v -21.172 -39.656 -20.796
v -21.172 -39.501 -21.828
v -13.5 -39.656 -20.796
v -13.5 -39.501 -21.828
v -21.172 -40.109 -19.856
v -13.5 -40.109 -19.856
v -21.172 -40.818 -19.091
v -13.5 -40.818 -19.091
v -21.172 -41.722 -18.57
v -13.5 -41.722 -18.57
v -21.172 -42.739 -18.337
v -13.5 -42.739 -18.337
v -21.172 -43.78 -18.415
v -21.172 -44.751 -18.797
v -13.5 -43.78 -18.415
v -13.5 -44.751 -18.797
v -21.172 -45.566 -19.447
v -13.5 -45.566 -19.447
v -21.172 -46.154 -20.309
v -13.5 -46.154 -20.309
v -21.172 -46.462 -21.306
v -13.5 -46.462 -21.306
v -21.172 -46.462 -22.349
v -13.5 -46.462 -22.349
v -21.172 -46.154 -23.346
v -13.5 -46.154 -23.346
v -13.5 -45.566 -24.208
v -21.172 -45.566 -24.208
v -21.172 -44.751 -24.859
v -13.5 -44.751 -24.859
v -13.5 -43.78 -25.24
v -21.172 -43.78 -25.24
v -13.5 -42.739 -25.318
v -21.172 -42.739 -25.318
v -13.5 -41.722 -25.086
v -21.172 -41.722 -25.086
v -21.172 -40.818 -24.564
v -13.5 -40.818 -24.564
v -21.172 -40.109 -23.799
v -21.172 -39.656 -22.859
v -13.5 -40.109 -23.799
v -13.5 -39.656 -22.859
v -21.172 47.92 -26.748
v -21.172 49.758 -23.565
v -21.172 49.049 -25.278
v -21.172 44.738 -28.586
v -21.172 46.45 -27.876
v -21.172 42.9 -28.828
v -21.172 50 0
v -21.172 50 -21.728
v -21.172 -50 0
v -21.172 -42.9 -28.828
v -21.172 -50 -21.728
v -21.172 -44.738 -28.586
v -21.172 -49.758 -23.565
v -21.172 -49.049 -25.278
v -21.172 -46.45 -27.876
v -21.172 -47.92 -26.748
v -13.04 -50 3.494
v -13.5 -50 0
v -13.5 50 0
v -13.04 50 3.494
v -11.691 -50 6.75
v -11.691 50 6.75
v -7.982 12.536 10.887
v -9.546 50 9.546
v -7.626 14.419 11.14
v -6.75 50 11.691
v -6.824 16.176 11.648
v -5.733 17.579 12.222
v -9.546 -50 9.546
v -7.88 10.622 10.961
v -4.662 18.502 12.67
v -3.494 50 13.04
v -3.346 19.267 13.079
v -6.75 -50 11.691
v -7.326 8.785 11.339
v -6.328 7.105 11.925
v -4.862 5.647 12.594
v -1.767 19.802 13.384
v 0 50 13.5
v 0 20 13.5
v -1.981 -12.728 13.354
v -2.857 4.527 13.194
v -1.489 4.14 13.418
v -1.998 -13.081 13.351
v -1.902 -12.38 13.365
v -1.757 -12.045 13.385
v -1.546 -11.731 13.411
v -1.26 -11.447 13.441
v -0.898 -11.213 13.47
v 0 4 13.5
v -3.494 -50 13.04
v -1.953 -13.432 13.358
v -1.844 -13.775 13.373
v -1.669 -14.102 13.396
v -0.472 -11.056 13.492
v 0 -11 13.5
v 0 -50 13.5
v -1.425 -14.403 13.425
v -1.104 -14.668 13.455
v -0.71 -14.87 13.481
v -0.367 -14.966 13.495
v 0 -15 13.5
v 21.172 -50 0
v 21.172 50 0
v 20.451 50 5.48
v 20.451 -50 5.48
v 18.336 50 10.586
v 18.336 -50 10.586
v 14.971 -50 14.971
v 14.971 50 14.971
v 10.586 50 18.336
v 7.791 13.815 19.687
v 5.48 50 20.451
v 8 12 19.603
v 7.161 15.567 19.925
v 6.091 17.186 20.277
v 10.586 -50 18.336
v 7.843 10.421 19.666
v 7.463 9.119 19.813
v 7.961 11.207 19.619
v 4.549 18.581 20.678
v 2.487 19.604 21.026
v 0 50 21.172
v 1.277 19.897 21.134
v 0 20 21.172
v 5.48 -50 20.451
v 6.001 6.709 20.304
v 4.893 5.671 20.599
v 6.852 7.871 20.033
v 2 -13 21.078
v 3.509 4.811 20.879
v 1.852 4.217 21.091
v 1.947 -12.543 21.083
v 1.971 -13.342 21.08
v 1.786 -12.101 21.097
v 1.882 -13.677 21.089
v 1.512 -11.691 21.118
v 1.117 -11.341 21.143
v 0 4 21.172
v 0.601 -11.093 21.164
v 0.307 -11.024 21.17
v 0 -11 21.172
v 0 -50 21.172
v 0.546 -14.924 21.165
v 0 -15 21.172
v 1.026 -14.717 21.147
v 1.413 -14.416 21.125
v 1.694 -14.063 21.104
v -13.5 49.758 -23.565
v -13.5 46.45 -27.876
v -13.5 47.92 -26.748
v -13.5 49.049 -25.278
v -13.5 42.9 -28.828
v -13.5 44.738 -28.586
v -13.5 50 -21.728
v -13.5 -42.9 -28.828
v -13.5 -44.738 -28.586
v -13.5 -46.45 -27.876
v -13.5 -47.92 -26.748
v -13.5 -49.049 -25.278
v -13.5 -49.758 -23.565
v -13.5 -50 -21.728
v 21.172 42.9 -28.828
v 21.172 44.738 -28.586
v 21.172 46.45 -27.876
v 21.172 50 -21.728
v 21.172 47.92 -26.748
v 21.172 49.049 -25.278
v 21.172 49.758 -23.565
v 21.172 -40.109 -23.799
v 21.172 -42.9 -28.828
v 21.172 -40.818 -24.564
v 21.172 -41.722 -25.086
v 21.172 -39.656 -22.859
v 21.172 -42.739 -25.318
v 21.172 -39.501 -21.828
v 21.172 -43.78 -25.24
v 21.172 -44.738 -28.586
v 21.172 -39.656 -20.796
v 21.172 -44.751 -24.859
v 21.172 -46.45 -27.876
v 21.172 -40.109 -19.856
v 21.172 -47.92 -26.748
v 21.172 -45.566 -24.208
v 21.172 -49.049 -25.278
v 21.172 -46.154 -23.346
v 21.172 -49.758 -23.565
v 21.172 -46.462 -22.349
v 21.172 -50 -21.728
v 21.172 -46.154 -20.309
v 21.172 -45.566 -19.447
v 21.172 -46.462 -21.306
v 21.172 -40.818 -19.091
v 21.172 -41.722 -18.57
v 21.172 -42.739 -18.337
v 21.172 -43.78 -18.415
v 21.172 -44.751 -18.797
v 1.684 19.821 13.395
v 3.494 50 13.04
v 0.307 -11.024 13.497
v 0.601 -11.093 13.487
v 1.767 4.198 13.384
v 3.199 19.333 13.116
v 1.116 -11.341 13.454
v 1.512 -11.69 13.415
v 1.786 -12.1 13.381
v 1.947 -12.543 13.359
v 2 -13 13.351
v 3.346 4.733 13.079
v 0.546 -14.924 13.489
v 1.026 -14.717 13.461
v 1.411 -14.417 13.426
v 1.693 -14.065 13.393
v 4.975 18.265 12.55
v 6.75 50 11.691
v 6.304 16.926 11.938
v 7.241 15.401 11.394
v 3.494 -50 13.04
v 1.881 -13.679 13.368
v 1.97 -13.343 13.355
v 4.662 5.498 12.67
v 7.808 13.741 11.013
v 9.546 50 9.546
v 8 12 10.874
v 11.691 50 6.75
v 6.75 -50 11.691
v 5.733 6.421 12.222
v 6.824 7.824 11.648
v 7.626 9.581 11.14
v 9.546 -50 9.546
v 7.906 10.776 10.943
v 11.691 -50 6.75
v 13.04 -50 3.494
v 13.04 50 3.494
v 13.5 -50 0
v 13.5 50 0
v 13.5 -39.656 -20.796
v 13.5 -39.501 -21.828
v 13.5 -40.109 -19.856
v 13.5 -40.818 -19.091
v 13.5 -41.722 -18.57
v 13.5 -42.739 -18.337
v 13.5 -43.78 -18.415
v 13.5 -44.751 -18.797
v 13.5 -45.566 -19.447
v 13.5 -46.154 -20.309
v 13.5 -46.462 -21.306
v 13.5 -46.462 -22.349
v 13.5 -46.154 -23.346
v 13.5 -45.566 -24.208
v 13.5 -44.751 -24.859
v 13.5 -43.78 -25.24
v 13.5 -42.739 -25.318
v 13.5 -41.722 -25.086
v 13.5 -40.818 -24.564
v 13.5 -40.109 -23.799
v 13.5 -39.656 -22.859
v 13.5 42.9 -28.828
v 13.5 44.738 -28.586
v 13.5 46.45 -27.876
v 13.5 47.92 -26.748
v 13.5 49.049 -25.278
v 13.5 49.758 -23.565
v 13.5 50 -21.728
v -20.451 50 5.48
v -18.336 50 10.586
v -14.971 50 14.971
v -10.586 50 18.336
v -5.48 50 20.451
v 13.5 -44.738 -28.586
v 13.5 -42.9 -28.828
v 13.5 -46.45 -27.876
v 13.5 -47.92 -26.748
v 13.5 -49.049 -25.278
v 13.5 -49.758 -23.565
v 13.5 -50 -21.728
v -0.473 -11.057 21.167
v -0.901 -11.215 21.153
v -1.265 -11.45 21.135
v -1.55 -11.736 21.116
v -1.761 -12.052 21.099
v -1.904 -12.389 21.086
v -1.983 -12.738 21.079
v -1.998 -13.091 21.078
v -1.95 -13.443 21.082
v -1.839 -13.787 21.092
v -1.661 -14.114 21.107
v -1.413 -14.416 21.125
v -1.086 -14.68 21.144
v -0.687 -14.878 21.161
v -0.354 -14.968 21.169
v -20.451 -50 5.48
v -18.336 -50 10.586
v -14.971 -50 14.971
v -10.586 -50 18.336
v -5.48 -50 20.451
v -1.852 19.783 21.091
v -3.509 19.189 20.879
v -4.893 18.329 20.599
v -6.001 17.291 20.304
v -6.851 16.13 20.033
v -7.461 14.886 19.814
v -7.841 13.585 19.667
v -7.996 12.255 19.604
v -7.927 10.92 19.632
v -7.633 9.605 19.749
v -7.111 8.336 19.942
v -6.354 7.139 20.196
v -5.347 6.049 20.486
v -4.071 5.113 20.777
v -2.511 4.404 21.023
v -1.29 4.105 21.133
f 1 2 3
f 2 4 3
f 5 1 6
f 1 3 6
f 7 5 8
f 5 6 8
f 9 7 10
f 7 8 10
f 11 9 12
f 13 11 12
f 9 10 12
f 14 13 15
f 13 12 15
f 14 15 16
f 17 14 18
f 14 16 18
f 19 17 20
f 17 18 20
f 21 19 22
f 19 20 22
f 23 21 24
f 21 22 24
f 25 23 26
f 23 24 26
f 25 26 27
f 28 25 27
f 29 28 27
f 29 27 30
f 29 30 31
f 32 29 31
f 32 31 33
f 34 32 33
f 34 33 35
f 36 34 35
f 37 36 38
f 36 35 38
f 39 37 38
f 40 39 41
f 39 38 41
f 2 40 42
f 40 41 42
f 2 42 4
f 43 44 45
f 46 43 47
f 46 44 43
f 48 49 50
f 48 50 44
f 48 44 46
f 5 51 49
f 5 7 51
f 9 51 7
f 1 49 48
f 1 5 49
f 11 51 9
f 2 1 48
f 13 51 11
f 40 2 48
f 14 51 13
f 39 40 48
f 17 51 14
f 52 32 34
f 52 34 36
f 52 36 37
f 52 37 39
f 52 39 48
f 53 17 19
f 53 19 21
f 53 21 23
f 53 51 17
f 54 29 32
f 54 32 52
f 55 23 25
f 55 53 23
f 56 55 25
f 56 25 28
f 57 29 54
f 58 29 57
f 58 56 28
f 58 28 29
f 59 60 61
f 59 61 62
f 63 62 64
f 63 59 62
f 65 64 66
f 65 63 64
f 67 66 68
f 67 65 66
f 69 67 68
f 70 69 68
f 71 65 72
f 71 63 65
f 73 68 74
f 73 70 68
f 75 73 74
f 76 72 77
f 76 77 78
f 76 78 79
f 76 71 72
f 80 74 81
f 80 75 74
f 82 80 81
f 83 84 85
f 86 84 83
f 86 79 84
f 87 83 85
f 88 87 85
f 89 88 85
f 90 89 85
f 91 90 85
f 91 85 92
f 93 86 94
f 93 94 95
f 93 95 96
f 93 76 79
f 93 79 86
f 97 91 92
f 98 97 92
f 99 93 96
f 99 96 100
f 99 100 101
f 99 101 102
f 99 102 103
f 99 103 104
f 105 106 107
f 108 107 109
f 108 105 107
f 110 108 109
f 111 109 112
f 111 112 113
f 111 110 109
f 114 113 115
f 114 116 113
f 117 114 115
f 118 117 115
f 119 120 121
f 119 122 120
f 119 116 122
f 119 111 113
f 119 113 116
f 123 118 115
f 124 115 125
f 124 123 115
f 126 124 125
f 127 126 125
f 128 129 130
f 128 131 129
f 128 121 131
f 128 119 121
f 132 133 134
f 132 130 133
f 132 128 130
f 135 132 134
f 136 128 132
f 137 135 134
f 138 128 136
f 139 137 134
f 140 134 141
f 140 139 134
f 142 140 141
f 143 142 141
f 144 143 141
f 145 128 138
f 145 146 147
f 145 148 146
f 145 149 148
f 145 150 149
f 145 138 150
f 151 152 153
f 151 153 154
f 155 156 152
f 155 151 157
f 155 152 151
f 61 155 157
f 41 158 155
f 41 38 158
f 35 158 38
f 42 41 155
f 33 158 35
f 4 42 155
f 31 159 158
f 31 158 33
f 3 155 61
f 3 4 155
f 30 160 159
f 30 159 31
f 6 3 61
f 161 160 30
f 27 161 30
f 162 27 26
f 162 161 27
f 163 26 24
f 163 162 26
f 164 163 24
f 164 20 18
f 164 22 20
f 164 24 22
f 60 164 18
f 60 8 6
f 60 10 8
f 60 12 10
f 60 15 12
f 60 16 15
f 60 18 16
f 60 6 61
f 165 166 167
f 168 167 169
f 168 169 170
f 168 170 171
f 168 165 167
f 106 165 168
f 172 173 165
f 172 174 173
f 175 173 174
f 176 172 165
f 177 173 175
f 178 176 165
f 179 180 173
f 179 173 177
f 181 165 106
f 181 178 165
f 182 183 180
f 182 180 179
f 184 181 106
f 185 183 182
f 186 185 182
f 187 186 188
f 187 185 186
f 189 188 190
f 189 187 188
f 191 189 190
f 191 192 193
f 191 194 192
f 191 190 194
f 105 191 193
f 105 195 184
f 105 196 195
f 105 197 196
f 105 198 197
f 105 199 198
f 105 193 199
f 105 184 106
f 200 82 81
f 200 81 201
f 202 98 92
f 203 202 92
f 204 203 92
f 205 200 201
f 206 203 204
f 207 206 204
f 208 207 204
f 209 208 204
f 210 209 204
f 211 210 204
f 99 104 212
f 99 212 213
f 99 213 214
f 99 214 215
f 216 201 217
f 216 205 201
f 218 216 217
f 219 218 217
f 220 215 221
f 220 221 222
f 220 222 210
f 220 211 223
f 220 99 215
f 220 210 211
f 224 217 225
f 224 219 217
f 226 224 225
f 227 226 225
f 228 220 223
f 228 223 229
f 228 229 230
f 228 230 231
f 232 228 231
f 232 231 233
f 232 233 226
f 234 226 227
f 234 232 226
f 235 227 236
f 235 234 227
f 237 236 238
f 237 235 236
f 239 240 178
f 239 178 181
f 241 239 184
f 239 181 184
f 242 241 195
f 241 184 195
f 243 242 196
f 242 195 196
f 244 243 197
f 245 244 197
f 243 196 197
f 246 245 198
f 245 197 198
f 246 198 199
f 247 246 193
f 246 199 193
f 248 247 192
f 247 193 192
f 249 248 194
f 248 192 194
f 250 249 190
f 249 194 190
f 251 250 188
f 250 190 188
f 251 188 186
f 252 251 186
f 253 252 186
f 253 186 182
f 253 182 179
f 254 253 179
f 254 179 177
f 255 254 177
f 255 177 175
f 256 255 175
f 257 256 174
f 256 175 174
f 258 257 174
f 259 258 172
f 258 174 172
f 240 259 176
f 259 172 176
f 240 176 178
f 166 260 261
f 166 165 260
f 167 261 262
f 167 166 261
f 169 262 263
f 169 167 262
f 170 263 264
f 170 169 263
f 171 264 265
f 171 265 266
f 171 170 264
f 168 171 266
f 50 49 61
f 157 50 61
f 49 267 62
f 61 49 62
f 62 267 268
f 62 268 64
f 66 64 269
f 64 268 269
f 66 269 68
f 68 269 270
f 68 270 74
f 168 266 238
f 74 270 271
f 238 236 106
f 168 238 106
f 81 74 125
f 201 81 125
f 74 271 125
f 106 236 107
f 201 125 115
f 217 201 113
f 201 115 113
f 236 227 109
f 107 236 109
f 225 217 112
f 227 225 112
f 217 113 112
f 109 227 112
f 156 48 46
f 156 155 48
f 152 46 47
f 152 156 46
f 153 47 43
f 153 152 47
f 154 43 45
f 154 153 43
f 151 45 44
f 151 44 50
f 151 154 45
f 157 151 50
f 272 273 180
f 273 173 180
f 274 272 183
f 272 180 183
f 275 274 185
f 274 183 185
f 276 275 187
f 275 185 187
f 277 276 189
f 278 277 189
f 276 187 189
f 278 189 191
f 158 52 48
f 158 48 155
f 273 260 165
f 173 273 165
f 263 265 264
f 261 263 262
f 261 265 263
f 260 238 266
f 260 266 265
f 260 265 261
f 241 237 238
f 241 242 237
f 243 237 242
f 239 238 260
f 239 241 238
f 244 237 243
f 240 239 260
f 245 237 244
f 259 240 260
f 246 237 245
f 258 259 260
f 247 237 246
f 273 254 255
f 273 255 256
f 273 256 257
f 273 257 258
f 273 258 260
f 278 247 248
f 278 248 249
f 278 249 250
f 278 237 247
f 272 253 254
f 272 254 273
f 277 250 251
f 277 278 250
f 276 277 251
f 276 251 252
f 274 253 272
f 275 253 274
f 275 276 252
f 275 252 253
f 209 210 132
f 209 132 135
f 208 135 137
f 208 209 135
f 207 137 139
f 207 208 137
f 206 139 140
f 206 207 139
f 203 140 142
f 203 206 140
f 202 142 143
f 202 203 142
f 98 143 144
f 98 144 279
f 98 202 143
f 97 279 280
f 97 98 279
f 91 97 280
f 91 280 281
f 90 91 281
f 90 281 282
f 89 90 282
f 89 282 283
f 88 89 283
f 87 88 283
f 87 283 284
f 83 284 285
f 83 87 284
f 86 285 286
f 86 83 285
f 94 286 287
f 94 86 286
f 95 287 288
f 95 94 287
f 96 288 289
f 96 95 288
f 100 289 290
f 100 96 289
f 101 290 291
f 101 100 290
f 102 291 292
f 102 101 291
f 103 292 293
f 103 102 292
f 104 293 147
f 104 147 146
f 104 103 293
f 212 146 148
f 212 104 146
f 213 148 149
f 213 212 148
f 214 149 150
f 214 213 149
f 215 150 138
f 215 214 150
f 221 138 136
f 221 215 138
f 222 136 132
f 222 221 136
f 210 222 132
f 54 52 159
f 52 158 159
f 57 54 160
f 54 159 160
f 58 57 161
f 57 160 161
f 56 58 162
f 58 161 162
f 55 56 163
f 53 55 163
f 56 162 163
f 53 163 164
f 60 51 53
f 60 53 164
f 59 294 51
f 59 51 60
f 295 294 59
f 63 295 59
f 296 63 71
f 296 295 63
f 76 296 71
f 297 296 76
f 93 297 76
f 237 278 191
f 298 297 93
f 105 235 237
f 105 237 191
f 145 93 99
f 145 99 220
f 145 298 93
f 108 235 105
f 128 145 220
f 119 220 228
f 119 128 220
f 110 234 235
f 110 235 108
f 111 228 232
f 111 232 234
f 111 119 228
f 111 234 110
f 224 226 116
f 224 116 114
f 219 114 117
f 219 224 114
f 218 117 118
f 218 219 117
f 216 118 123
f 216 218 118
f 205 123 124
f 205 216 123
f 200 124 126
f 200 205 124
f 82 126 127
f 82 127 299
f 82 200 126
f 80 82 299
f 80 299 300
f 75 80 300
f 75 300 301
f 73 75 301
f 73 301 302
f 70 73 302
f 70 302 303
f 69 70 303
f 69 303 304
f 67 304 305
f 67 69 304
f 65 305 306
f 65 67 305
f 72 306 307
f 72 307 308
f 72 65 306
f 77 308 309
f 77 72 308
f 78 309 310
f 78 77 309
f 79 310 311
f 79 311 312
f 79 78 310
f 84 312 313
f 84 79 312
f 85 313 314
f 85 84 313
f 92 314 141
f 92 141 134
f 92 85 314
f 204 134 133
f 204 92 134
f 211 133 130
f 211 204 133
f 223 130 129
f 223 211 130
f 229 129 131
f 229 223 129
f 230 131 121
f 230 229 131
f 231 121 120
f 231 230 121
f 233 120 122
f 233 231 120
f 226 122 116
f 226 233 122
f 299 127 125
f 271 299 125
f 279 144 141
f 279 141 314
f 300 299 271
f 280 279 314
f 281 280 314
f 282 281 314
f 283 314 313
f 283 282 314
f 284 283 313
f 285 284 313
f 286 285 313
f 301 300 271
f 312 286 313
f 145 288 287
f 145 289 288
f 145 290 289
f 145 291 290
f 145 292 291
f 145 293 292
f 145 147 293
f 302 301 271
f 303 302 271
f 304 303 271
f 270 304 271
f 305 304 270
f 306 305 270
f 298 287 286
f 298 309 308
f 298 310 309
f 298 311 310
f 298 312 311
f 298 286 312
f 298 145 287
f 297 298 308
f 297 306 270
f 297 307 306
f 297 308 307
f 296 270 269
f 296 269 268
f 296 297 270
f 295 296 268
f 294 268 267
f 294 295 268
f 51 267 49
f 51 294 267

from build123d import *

# Parameters (mm, degrees)
F1_DEPTH = 50
F2_R     = 7.1
F3_R     = 3.5
F4_DEPTH = 25
F5_R     = 2
F5_R_2   = 8
F6_DEPTH = 25


with BuildPart() as f1:
    # F0 (on Front) → F1 (new body, symmetric)
    with BuildSketch(Plane.XZ):
        with BuildLine():
            ThreePointArc((-13.5, 0), (-9.545942, 9.545942), (0, 13.5))
            Line((0, 13.5), (0, 21.172315))
            ThreePointArc((0, 21.172315), (-14.971087, 14.971087), (-21.172315, 0))
            Line((-21.172315, 0), (-21.172315, -28.827685))
            Line((-21.172315, -28.827685), (-13.5, -28.827685))
            Line((-13.5, -28.827685), (-13.5, 0))
        make_face()
        with BuildLine():
            ThreePointArc((0, 13.5), (9.545942, 9.545942), (13.5, 0))
            Line((13.5, 0), (13.5, -28.827685))
            Line((13.5, -28.827685), (21.172315, -28.827685))
            Line((21.172315, -28.827685), (21.172315, 0))
            ThreePointArc((21.172315, 0), (14.971087, 14.971087), (0, 21.172315))
            Line((0, 21.172315), (0, 13.5))
        make_face()
    extrude(amount=F1_DEPTH, both=True)

    # F2
    f2_edges = [f1.edges().sort_by_distance(p)[0] for p in [
        (17.336157, 50, -28.827685),
        (-17.336157, 50, -28.827685),
        (-17.336157, -50, -28.827685),
        (17.336157, -50, -28.827685),
    ]]
    fillet(f2_edges, radius=F2_R)

    # F3 (on Right) → F4 (cut, symmetric)
    with BuildSketch(Plane.YZ):
        with Locations((-43.000714, -21.827685)):
            Circle(F3_R)
    extrude(amount=F4_DEPTH, both=True, mode=Mode.SUBTRACT)

    # F5 (on Top) → F6 (cut)
    with BuildSketch(Plane.XY):
        with Locations((0, -13)):
            Circle(F5_R)
        with Locations((0, 12)):
            Circle(F5_R_2)
    extrude(amount=F6_DEPTH, mode=Mode.SUBTRACT)


solid = f1.part
